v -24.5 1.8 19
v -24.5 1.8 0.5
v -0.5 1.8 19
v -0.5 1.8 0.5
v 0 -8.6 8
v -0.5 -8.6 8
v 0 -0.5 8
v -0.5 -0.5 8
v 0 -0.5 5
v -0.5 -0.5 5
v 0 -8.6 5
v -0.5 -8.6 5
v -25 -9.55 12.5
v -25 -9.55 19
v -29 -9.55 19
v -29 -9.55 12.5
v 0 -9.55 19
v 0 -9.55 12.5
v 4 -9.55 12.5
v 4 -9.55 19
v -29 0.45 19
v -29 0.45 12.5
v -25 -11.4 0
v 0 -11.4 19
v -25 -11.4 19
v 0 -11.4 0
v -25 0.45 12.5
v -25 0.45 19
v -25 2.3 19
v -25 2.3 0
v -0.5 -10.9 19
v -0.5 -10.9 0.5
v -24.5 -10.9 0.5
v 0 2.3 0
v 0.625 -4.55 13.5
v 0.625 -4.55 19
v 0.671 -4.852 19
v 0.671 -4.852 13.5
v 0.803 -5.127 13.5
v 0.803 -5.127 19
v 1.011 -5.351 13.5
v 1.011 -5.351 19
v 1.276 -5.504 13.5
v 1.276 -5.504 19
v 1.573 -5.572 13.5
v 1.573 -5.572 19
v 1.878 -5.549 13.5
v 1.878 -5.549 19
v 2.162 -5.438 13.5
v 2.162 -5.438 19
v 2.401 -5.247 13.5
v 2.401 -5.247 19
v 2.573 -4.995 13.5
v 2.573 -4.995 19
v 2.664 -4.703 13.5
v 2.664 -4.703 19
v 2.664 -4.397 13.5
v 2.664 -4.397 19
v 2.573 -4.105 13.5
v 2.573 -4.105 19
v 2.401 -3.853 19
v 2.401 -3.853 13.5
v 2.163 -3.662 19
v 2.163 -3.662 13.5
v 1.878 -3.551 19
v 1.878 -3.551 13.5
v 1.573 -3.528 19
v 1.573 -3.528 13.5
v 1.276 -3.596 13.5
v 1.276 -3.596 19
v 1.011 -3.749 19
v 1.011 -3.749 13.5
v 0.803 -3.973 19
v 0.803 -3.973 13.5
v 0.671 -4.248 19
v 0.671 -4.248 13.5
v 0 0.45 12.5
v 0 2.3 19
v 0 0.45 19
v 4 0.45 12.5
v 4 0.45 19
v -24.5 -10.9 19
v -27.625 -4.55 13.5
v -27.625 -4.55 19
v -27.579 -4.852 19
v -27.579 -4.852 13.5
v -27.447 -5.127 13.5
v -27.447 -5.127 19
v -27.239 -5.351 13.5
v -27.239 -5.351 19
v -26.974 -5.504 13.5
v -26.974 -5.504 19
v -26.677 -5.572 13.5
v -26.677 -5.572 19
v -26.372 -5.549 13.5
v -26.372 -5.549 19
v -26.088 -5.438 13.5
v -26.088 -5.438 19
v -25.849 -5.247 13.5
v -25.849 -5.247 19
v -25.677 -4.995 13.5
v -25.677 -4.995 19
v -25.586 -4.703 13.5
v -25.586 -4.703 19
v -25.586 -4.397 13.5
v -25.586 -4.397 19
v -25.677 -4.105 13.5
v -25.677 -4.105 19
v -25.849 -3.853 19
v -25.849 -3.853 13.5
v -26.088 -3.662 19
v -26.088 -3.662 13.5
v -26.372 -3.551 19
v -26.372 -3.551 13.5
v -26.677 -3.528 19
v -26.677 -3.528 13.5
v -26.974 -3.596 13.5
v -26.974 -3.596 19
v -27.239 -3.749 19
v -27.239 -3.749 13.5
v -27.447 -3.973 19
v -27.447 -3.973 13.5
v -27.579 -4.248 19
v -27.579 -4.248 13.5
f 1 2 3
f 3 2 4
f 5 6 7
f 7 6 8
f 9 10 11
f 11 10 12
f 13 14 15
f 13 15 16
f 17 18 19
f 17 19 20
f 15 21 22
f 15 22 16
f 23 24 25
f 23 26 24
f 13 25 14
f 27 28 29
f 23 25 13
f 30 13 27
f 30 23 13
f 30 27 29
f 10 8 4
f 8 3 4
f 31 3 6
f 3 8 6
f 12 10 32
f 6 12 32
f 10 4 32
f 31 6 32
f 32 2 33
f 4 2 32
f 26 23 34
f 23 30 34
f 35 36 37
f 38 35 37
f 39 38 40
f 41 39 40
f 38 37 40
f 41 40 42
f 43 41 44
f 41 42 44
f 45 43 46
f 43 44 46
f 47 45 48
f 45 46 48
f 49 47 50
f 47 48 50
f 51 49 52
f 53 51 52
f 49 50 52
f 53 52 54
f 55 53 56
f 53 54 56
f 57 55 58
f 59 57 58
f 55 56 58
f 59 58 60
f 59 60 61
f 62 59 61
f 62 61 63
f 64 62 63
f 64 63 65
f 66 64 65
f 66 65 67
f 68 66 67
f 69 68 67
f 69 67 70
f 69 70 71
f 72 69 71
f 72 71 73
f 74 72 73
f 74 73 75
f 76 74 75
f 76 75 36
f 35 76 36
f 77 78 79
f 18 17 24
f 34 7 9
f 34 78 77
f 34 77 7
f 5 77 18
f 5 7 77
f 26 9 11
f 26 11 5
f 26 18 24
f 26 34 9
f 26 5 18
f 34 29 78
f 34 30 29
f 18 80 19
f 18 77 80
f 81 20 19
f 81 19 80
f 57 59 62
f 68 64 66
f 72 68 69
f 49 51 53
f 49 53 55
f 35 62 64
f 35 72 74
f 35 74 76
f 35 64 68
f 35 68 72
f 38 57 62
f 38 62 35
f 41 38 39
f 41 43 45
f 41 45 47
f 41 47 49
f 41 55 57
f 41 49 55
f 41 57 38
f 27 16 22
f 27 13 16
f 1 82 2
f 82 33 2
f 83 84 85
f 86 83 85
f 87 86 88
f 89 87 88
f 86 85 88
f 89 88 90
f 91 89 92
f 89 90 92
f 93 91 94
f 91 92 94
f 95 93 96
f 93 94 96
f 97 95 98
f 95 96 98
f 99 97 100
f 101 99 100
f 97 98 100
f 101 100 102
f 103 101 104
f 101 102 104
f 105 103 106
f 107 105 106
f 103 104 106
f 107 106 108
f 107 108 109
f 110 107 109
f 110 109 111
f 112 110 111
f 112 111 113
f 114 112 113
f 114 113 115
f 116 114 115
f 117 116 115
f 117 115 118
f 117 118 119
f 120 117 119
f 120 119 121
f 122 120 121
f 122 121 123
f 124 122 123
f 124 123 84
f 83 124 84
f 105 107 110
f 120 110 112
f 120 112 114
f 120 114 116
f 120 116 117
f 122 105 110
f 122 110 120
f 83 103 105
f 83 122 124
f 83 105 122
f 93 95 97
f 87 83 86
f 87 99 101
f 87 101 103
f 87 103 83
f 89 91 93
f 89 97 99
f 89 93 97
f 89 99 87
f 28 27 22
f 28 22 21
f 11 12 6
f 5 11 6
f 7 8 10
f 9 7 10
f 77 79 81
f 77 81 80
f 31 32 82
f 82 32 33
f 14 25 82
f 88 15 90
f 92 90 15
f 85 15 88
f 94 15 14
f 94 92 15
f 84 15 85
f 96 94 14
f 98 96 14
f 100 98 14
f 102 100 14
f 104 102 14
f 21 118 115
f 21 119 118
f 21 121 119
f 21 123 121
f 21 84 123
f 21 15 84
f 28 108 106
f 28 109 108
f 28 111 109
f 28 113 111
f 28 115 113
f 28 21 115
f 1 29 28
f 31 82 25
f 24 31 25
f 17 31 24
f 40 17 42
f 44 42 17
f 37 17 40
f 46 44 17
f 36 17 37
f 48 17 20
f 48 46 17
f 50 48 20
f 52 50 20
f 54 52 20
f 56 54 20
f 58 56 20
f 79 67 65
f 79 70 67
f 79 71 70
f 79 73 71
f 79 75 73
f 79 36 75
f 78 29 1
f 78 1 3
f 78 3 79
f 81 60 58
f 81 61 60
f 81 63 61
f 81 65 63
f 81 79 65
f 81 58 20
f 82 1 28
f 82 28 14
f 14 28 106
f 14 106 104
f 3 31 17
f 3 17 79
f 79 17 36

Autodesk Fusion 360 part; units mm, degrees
sketch "Sketch1" plane through (0, 0, 0) normal (0, 0, 1) x (1, 0, 0)
  line L0 (-25, -11.4) -> (-25, 2.3)
  line L1 (-25, 2.3) -> (0, 2.3)
  line L2 (0, 2.3) -> (0, -11.4)
  line L3 (0, -11.4) -> (-25, -11.4)
  dimension "d1" = 13.7
  dimension "d2" = 25
extrude "Extrude1" add sketch "Sketch1" along normal blind 19
shell "Shell1" thickness 0.5 removed faces 1 at (-8.3333, -6.8333, 19)
sketch "Sketch2" plane through (0, 0, 0) normal (1, 0, 0) x (0, 1, 0)
  line L0 (-11.4, 0) -> (2.3, 0)
  line L1 (2.3, 0) -> (2.3, 19)
  line L2 (2.3, 19) -> (-11.4, 19)
  line L3 (-11.4, 19) -> (-11.4, 0)
  line L4 (-8.6, 8) -> (-0.5, 8)
  line L5 (-0.5, 8) -> (-0.5, 5)
  line L6 (-0.5, 5) -> (-8.6, 5)
  line L7 (-8.6, 5) -> (-8.6, 8)
  dimension "d6" = 5
  dimension "d7" = 8.1
  dimension "d8" = 2.8
  dimension "d9" = 2.8
extrude "Extrude2" cut sketch "Sketch2" along normal mid plane 6 contours L4 L5 L6 L7
sketch "Sketch3" plane through (0, 0, 0) normal (1, 0, 0) x (0, 1, 0)
  line L0 (-0.5, 8) -> (-0.5, 5)
  line L1 (-0.5, 5) -> (-8.6, 5)
  line L2 (-8.6, 5) -> (-8.6, 8)
  line L3 (-8.6, 8) -> (-0.5, 8)
  line L4 (-11.4, 0) -> (2.3, 0)
  line L5 (2.3, 0) -> (2.3, 19)
  line L6 (2.3, 19) -> (-11.4, 19)
  line L7 (-11.4, 19) -> (-11.4, 0)
  line L8 (-9.55, 19) -> (0.45, 19)
  line L9 (0.45, 19) -> (0.45, 12.5)
  line L10 (0.45, 12.5) -> (-9.55, 12.5)
  line L11 (-9.55, 12.5) -> (-9.55, 19)
  dimension "d19" = 10
  dimension "d20" = 1.85
  dimension "d23" = 6.5
extrude "Extrude3" add sketch "Sketch3" along normal blind 4 contours L6 L8 L9 L10 L11
sketch "Sketch4" plane through (0, 0, 19) normal (0, 0, 1) x (-1, 0, 0)
  line L0 (0.5, 10.9) -> (24.5, 10.9)
  line L1 (24.5, 10.9) -> (24.5, -1.8)
  line L2 (24.5, -1.8) -> (0.5, -1.8)
  line L3 (0.5, -1.8) -> (0.5, 10.9)
  line L4 (0, 11.4) -> (0, 9.55)
  line L5 (0, 9.55) -> (-4, 9.55)
  line L6 (-4, 9.55) -> (-4, -0.45)
  line L7 (-4, -0.45) -> (0, -0.45)
  line L8 (0, -0.45) -> (0, -2.3)
  line L9 (0, -2.3) -> (25, -2.3)
  line L10 (25, -2.3) -> (25, 11.4)
  line L11 (25, 11.4) -> (0, 11.4)
  circle A0 centre (-1.65, 4.55) radius 1.025
  dimension "d16" = 2.05
  dimension "d32" = 5
  dimension "d33" = 2.15
extrude "Extrude4" cut sketch "Sketch4" against normal blind 5.5 contours A0
sketch "Sketch6" plane through (-25, 0, 0) normal (-1, 0, 0) x (0, -1, 0)
  line L0 (-2.3, 0) -> (11.4, 0)
  line L1 (11.4, 0) -> (11.4, 19)
  line L2 (11.4, 19) -> (-2.3, 19)
  line L3 (-2.3, 19) -> (-2.3, 0)
  line L4 (-0.45, 19) -> (9.55, 19)
  line L5 (9.55, 19) -> (9.55, 12.5)
  line L6 (9.55, 12.5) -> (-0.45, 12.5)
  line L7 (-0.45, 12.5) -> (-0.45, 19)
  dimension "d27" = 1.85
  dimension "d28" = 10
  dimension "d29" = 6.5
extrude "Extrude5" add sketch "Sketch6" along normal blind 4 contours L2 L4 L5 L6 L7
sketch "Sketch7" plane through (0, 0, 19) normal (0, 0, 1) x (-1, 0, 0)
  circle A0 centre (-1.65, 4.55) radius 1.025
  line L0 (0.5, 10.9) -> (24.5, 10.9)
  line L1 (24.5, 10.9) -> (24.5, -1.8)
  line L2 (24.5, -1.8) -> (0.5, -1.8)
  line L3 (0.5, -1.8) -> (0.5, 10.9)
  line L4 (0, 11.4) -> (0, 9.55)
  line L5 (0, 9.55) -> (-4, 9.55)
  line L6 (-4, 9.55) -> (-4, -0.45)
  line L7 (-4, -0.45) -> (0, -0.45)
  line L8 (0, -0.45) -> (0, -2.3)
  line L9 (0, -2.3) -> (25, -2.3)
  line L10 (25, -2.3) -> (25, -0.45)
  line L11 (25, -0.45) -> (29, -0.45)
  line L12 (29, -0.45) -> (29, 9.55)
  line L13 (29, 9.55) -> (25, 9.55)
  line L14 (25, 9.55) -> (25, 11.4)
  line L15 (25, 11.4) -> (0, 11.4)
  circle A1 centre (26.6, 4.55) radius 1.025
  dimension "d34" = 2.05
  dimension "d35" = 2.1
  dimension "d36" = 5
extrude "Extrude6" cut sketch "Sketch7" against normal blind 5.5 contours A1
